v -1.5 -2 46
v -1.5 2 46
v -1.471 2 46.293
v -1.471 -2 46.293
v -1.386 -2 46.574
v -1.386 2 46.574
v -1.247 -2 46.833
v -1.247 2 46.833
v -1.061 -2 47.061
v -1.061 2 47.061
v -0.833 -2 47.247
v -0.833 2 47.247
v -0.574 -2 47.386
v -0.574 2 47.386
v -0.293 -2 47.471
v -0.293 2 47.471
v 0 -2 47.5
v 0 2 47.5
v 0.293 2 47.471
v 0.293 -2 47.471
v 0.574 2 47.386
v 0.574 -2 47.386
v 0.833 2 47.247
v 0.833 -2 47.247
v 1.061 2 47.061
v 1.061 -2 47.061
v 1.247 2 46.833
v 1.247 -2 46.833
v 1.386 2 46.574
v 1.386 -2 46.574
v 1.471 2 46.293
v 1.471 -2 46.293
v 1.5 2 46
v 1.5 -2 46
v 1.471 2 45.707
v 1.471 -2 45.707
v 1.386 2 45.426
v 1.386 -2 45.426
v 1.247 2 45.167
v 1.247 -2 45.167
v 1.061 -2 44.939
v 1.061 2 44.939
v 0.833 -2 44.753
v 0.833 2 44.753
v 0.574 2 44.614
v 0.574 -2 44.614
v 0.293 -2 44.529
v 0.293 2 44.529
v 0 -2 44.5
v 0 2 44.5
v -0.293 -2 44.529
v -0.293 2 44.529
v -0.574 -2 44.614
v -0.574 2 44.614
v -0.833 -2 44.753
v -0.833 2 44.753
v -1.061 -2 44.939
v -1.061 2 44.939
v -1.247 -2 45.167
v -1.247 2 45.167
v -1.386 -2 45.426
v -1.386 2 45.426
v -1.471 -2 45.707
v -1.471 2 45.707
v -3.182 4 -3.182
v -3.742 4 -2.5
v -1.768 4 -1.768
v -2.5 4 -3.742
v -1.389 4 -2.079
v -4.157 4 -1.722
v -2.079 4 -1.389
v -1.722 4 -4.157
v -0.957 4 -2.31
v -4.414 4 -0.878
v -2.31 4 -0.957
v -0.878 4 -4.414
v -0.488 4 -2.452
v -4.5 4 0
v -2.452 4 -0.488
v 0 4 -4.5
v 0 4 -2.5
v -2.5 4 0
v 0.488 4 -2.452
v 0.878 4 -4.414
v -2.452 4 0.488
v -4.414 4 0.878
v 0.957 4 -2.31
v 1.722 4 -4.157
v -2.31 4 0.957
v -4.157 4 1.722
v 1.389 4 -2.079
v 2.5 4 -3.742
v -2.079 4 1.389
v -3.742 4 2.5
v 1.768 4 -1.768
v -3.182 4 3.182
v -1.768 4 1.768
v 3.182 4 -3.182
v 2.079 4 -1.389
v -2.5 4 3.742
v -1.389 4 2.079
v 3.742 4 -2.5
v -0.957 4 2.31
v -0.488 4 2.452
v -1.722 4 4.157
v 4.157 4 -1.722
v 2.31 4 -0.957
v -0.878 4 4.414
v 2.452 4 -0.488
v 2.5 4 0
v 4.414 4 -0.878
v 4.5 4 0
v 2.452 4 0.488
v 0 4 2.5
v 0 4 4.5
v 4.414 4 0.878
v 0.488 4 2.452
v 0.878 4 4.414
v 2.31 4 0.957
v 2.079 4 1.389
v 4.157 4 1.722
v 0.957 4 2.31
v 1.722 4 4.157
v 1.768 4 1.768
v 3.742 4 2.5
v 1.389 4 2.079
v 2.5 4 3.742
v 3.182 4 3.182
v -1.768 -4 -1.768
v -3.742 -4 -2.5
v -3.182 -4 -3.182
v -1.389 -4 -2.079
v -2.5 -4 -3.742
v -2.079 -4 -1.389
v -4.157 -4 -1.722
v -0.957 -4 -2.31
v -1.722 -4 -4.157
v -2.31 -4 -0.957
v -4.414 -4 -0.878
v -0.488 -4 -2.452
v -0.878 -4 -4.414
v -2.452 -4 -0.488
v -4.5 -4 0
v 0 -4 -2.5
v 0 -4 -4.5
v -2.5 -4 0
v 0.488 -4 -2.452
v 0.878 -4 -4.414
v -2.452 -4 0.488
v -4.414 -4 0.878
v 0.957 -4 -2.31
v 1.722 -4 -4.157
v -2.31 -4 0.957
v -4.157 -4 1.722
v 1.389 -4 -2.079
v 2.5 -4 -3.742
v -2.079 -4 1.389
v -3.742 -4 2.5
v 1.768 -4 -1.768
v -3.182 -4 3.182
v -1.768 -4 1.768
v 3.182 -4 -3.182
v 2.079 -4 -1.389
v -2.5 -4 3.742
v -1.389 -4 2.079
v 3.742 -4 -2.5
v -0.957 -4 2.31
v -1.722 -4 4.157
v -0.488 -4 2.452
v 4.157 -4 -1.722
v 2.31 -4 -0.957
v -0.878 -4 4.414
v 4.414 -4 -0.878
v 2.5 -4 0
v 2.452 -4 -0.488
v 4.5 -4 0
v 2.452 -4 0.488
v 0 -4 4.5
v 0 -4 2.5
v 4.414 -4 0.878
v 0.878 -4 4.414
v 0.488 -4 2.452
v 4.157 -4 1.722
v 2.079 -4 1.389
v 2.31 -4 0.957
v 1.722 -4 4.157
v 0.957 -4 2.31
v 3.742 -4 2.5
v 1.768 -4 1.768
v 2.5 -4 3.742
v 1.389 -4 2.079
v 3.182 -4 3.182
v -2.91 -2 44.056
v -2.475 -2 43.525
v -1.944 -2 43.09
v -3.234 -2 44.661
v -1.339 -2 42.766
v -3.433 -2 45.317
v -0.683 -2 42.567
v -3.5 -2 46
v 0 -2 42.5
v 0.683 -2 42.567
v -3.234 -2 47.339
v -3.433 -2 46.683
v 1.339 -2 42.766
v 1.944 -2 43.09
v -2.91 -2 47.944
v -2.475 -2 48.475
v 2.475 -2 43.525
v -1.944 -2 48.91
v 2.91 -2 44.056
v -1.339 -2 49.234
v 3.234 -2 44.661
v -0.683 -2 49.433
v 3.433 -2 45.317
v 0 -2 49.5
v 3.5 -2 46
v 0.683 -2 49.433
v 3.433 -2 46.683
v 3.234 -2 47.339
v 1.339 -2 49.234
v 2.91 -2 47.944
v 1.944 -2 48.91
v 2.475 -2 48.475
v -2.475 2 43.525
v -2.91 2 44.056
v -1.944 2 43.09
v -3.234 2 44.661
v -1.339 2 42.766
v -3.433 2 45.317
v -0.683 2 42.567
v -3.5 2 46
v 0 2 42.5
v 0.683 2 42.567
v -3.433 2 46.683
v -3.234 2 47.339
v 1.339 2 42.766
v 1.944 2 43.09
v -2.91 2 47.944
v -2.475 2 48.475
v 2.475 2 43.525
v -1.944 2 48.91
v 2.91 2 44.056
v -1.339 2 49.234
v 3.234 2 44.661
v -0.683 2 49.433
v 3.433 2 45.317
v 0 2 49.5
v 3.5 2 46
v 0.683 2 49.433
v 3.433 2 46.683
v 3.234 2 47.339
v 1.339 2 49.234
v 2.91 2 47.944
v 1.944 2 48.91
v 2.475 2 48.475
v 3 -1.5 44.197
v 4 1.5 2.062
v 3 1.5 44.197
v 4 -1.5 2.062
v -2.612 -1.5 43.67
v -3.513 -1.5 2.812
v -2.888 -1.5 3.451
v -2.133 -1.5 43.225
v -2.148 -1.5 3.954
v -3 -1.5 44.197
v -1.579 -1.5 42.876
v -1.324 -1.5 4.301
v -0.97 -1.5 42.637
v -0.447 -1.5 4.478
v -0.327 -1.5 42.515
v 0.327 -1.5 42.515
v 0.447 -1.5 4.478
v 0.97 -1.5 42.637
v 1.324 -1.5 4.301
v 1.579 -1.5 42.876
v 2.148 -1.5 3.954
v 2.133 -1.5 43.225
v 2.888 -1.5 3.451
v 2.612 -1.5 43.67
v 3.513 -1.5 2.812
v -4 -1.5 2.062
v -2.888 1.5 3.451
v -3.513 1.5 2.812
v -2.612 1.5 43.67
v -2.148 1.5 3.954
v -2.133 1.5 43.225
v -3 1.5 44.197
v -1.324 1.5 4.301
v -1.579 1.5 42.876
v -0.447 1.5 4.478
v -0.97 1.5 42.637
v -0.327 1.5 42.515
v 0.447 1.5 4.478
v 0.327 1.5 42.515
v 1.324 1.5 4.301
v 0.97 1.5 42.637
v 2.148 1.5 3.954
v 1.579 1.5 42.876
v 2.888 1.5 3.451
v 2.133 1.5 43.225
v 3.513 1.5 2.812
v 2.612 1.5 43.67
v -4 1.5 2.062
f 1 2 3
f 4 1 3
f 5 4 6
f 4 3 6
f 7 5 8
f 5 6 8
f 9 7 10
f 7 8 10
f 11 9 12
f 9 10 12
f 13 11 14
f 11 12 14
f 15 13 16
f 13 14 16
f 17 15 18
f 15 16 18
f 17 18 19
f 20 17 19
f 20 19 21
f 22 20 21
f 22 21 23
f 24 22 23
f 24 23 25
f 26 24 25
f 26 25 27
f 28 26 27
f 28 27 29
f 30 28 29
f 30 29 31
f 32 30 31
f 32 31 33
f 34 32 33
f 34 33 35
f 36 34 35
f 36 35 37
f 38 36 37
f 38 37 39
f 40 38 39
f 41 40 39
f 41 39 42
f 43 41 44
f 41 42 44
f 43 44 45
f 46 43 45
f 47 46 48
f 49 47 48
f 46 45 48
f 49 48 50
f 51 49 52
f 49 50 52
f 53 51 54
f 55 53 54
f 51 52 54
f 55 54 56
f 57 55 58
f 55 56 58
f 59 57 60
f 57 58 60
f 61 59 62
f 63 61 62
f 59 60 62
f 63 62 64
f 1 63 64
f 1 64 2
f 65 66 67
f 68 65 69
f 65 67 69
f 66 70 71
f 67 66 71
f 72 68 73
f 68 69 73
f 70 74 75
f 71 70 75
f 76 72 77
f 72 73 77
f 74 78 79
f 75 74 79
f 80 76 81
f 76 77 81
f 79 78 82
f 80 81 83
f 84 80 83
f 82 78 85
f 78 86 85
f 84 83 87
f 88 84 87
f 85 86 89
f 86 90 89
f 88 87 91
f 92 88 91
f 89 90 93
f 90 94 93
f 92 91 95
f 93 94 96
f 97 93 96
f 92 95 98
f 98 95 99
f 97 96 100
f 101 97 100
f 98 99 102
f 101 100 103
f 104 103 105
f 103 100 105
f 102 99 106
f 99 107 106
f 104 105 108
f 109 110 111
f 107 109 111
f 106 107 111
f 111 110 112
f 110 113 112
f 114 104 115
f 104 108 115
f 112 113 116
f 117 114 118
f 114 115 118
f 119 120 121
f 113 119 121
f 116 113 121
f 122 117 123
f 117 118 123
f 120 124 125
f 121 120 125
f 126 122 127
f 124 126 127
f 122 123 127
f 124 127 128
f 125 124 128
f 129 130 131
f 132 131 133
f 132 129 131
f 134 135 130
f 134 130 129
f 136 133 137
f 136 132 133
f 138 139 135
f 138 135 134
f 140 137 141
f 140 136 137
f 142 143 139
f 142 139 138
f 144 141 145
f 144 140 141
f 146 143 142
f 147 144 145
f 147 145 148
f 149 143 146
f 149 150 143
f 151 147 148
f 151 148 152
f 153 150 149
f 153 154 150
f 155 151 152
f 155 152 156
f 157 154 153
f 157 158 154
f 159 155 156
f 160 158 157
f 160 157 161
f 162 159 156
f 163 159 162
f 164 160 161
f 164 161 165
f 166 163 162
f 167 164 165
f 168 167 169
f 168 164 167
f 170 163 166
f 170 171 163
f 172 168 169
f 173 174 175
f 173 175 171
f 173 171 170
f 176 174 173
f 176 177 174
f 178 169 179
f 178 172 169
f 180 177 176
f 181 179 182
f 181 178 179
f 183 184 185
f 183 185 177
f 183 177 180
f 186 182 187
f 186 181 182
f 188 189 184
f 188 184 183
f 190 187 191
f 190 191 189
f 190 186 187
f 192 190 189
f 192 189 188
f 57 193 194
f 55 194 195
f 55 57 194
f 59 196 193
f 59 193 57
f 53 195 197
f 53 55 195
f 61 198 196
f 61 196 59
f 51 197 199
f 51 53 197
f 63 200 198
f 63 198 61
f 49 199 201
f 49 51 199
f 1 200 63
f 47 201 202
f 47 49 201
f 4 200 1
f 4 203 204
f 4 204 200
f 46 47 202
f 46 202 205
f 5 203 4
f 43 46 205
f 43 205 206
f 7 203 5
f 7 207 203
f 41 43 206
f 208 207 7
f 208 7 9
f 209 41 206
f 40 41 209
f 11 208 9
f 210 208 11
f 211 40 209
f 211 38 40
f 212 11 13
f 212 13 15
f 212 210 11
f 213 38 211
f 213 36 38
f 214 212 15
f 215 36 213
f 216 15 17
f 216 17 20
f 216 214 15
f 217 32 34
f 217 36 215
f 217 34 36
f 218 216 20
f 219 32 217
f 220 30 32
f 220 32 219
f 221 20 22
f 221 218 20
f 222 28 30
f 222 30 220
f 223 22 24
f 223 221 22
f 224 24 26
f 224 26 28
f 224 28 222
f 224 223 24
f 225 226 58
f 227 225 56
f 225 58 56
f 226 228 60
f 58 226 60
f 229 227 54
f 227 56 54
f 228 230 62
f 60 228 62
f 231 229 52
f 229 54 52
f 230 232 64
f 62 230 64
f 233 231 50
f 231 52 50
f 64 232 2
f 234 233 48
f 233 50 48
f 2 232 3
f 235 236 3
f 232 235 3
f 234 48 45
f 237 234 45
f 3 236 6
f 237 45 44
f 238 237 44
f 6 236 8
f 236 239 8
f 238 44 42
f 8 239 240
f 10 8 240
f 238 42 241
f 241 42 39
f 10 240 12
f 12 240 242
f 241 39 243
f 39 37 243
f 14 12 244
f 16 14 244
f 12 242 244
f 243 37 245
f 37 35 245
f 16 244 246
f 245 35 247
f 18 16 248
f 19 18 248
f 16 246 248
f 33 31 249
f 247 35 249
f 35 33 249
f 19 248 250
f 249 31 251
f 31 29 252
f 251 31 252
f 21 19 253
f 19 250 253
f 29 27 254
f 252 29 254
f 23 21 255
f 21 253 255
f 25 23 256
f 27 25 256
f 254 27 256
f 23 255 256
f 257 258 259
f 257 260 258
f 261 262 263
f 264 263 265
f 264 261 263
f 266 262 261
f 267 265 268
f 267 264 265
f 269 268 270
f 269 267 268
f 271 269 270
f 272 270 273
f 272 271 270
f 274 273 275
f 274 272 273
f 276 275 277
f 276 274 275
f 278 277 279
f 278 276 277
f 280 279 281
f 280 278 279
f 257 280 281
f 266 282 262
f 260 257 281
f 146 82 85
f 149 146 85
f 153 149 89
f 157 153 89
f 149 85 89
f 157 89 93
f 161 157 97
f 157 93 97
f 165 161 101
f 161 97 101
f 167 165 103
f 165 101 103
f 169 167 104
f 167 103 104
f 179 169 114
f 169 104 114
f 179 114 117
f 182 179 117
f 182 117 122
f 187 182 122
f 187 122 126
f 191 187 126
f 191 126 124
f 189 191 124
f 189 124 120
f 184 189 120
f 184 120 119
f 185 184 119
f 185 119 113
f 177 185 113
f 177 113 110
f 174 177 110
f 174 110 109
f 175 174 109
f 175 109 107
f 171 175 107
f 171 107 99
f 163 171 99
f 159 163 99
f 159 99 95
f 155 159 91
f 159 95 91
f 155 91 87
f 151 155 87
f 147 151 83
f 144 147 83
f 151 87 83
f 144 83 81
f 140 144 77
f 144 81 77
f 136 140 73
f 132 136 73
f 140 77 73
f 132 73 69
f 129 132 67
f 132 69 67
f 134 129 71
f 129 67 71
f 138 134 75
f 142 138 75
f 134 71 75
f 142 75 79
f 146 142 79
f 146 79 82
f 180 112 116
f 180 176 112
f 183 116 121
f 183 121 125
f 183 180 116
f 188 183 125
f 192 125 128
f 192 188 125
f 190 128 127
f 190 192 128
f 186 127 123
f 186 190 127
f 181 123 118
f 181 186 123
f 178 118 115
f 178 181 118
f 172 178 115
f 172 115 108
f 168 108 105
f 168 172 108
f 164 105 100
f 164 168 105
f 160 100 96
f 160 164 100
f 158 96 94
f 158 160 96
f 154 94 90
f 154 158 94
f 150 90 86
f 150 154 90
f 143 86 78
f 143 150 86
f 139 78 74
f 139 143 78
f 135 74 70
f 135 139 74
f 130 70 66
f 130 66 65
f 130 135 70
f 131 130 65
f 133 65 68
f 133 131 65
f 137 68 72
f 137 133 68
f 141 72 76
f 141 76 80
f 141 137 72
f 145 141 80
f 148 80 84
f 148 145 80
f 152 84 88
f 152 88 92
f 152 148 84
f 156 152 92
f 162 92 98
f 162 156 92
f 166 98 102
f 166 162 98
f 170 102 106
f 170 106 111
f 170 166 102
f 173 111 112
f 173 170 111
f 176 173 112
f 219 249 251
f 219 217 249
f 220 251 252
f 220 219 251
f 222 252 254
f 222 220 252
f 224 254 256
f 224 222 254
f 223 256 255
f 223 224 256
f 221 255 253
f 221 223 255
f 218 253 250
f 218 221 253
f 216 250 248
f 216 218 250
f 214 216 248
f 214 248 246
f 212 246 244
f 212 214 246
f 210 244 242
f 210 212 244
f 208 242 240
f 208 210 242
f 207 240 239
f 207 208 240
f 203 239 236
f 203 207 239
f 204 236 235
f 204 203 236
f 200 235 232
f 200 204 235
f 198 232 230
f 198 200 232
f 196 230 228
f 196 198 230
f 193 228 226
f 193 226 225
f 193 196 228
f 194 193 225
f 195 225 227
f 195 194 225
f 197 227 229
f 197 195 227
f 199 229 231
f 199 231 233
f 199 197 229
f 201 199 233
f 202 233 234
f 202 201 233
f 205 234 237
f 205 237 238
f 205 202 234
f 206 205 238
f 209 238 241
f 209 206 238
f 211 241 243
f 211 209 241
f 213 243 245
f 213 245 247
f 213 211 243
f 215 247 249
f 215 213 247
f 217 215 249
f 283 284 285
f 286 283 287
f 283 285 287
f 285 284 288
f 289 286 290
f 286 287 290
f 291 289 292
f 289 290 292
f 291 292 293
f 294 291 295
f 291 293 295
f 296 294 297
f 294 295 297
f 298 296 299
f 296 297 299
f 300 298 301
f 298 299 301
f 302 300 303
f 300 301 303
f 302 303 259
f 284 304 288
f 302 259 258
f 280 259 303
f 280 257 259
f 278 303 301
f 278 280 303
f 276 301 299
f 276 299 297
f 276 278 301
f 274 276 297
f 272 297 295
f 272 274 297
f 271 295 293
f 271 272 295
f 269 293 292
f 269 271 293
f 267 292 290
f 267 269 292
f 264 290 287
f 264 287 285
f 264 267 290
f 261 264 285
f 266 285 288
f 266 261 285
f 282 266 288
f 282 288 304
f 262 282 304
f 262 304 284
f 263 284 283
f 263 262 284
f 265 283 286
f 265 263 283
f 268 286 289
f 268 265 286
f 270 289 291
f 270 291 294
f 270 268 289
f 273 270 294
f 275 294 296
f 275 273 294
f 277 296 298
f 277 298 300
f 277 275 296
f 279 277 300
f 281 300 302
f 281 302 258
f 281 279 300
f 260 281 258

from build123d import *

# Parameters (mm, degrees)
F0_R     = 4.5
F1_DEPTH = 4
F2_R     = 3.5
F3_DEPTH = 2
F5_DEPTH = 1.5
F7_D     = 5
F8_D     = 3


with BuildPart() as f1:
    # F0 (on Front) → F1 (new body, symmetric)
    with BuildSketch(Plane.XZ):
        Circle(F0_R)
    extrude(amount=F1_DEPTH, both=True)

    # F7 (through all)
    with Locations(Plane.XZ.offset(4)):
        with Locations((0, 0)):
            Hole(F7_D / 2)


with BuildPart() as f3:
    # F2 (on Front) → F3 (new body, symmetric)
    with BuildSketch(Plane.XZ):
        with Locations((0, 46)):
            Circle(F2_R)
    extrude(amount=F3_DEPTH, both=True)

    # F8 (through all)
    with Locations(Plane.XZ.offset(4)):
        with Locations((0, 46)):
            Hole(F8_D / 2)


with BuildPart() as f5:
    # F4 (on Front) → F5 (new body, symmetric)
    with BuildSketch(Plane.XZ):
        with BuildLine():
            ThreePointArc((3, 44.1972243623), (0, 42.5), (-3, 44.1972243623))
            Line((-3, 44.1972243623), (-4, 2.0615528128))
            ThreePointArc((-4, 2.0615528128), (0, 4.5), (4, 2.0615528128))
            Line((4, 2.0615528128), (3, 44.1972243623))
        make_face()
    extrude(amount=F5_DEPTH, both=True)


solid = Compound([f1.part, f3.part, f5.part])
